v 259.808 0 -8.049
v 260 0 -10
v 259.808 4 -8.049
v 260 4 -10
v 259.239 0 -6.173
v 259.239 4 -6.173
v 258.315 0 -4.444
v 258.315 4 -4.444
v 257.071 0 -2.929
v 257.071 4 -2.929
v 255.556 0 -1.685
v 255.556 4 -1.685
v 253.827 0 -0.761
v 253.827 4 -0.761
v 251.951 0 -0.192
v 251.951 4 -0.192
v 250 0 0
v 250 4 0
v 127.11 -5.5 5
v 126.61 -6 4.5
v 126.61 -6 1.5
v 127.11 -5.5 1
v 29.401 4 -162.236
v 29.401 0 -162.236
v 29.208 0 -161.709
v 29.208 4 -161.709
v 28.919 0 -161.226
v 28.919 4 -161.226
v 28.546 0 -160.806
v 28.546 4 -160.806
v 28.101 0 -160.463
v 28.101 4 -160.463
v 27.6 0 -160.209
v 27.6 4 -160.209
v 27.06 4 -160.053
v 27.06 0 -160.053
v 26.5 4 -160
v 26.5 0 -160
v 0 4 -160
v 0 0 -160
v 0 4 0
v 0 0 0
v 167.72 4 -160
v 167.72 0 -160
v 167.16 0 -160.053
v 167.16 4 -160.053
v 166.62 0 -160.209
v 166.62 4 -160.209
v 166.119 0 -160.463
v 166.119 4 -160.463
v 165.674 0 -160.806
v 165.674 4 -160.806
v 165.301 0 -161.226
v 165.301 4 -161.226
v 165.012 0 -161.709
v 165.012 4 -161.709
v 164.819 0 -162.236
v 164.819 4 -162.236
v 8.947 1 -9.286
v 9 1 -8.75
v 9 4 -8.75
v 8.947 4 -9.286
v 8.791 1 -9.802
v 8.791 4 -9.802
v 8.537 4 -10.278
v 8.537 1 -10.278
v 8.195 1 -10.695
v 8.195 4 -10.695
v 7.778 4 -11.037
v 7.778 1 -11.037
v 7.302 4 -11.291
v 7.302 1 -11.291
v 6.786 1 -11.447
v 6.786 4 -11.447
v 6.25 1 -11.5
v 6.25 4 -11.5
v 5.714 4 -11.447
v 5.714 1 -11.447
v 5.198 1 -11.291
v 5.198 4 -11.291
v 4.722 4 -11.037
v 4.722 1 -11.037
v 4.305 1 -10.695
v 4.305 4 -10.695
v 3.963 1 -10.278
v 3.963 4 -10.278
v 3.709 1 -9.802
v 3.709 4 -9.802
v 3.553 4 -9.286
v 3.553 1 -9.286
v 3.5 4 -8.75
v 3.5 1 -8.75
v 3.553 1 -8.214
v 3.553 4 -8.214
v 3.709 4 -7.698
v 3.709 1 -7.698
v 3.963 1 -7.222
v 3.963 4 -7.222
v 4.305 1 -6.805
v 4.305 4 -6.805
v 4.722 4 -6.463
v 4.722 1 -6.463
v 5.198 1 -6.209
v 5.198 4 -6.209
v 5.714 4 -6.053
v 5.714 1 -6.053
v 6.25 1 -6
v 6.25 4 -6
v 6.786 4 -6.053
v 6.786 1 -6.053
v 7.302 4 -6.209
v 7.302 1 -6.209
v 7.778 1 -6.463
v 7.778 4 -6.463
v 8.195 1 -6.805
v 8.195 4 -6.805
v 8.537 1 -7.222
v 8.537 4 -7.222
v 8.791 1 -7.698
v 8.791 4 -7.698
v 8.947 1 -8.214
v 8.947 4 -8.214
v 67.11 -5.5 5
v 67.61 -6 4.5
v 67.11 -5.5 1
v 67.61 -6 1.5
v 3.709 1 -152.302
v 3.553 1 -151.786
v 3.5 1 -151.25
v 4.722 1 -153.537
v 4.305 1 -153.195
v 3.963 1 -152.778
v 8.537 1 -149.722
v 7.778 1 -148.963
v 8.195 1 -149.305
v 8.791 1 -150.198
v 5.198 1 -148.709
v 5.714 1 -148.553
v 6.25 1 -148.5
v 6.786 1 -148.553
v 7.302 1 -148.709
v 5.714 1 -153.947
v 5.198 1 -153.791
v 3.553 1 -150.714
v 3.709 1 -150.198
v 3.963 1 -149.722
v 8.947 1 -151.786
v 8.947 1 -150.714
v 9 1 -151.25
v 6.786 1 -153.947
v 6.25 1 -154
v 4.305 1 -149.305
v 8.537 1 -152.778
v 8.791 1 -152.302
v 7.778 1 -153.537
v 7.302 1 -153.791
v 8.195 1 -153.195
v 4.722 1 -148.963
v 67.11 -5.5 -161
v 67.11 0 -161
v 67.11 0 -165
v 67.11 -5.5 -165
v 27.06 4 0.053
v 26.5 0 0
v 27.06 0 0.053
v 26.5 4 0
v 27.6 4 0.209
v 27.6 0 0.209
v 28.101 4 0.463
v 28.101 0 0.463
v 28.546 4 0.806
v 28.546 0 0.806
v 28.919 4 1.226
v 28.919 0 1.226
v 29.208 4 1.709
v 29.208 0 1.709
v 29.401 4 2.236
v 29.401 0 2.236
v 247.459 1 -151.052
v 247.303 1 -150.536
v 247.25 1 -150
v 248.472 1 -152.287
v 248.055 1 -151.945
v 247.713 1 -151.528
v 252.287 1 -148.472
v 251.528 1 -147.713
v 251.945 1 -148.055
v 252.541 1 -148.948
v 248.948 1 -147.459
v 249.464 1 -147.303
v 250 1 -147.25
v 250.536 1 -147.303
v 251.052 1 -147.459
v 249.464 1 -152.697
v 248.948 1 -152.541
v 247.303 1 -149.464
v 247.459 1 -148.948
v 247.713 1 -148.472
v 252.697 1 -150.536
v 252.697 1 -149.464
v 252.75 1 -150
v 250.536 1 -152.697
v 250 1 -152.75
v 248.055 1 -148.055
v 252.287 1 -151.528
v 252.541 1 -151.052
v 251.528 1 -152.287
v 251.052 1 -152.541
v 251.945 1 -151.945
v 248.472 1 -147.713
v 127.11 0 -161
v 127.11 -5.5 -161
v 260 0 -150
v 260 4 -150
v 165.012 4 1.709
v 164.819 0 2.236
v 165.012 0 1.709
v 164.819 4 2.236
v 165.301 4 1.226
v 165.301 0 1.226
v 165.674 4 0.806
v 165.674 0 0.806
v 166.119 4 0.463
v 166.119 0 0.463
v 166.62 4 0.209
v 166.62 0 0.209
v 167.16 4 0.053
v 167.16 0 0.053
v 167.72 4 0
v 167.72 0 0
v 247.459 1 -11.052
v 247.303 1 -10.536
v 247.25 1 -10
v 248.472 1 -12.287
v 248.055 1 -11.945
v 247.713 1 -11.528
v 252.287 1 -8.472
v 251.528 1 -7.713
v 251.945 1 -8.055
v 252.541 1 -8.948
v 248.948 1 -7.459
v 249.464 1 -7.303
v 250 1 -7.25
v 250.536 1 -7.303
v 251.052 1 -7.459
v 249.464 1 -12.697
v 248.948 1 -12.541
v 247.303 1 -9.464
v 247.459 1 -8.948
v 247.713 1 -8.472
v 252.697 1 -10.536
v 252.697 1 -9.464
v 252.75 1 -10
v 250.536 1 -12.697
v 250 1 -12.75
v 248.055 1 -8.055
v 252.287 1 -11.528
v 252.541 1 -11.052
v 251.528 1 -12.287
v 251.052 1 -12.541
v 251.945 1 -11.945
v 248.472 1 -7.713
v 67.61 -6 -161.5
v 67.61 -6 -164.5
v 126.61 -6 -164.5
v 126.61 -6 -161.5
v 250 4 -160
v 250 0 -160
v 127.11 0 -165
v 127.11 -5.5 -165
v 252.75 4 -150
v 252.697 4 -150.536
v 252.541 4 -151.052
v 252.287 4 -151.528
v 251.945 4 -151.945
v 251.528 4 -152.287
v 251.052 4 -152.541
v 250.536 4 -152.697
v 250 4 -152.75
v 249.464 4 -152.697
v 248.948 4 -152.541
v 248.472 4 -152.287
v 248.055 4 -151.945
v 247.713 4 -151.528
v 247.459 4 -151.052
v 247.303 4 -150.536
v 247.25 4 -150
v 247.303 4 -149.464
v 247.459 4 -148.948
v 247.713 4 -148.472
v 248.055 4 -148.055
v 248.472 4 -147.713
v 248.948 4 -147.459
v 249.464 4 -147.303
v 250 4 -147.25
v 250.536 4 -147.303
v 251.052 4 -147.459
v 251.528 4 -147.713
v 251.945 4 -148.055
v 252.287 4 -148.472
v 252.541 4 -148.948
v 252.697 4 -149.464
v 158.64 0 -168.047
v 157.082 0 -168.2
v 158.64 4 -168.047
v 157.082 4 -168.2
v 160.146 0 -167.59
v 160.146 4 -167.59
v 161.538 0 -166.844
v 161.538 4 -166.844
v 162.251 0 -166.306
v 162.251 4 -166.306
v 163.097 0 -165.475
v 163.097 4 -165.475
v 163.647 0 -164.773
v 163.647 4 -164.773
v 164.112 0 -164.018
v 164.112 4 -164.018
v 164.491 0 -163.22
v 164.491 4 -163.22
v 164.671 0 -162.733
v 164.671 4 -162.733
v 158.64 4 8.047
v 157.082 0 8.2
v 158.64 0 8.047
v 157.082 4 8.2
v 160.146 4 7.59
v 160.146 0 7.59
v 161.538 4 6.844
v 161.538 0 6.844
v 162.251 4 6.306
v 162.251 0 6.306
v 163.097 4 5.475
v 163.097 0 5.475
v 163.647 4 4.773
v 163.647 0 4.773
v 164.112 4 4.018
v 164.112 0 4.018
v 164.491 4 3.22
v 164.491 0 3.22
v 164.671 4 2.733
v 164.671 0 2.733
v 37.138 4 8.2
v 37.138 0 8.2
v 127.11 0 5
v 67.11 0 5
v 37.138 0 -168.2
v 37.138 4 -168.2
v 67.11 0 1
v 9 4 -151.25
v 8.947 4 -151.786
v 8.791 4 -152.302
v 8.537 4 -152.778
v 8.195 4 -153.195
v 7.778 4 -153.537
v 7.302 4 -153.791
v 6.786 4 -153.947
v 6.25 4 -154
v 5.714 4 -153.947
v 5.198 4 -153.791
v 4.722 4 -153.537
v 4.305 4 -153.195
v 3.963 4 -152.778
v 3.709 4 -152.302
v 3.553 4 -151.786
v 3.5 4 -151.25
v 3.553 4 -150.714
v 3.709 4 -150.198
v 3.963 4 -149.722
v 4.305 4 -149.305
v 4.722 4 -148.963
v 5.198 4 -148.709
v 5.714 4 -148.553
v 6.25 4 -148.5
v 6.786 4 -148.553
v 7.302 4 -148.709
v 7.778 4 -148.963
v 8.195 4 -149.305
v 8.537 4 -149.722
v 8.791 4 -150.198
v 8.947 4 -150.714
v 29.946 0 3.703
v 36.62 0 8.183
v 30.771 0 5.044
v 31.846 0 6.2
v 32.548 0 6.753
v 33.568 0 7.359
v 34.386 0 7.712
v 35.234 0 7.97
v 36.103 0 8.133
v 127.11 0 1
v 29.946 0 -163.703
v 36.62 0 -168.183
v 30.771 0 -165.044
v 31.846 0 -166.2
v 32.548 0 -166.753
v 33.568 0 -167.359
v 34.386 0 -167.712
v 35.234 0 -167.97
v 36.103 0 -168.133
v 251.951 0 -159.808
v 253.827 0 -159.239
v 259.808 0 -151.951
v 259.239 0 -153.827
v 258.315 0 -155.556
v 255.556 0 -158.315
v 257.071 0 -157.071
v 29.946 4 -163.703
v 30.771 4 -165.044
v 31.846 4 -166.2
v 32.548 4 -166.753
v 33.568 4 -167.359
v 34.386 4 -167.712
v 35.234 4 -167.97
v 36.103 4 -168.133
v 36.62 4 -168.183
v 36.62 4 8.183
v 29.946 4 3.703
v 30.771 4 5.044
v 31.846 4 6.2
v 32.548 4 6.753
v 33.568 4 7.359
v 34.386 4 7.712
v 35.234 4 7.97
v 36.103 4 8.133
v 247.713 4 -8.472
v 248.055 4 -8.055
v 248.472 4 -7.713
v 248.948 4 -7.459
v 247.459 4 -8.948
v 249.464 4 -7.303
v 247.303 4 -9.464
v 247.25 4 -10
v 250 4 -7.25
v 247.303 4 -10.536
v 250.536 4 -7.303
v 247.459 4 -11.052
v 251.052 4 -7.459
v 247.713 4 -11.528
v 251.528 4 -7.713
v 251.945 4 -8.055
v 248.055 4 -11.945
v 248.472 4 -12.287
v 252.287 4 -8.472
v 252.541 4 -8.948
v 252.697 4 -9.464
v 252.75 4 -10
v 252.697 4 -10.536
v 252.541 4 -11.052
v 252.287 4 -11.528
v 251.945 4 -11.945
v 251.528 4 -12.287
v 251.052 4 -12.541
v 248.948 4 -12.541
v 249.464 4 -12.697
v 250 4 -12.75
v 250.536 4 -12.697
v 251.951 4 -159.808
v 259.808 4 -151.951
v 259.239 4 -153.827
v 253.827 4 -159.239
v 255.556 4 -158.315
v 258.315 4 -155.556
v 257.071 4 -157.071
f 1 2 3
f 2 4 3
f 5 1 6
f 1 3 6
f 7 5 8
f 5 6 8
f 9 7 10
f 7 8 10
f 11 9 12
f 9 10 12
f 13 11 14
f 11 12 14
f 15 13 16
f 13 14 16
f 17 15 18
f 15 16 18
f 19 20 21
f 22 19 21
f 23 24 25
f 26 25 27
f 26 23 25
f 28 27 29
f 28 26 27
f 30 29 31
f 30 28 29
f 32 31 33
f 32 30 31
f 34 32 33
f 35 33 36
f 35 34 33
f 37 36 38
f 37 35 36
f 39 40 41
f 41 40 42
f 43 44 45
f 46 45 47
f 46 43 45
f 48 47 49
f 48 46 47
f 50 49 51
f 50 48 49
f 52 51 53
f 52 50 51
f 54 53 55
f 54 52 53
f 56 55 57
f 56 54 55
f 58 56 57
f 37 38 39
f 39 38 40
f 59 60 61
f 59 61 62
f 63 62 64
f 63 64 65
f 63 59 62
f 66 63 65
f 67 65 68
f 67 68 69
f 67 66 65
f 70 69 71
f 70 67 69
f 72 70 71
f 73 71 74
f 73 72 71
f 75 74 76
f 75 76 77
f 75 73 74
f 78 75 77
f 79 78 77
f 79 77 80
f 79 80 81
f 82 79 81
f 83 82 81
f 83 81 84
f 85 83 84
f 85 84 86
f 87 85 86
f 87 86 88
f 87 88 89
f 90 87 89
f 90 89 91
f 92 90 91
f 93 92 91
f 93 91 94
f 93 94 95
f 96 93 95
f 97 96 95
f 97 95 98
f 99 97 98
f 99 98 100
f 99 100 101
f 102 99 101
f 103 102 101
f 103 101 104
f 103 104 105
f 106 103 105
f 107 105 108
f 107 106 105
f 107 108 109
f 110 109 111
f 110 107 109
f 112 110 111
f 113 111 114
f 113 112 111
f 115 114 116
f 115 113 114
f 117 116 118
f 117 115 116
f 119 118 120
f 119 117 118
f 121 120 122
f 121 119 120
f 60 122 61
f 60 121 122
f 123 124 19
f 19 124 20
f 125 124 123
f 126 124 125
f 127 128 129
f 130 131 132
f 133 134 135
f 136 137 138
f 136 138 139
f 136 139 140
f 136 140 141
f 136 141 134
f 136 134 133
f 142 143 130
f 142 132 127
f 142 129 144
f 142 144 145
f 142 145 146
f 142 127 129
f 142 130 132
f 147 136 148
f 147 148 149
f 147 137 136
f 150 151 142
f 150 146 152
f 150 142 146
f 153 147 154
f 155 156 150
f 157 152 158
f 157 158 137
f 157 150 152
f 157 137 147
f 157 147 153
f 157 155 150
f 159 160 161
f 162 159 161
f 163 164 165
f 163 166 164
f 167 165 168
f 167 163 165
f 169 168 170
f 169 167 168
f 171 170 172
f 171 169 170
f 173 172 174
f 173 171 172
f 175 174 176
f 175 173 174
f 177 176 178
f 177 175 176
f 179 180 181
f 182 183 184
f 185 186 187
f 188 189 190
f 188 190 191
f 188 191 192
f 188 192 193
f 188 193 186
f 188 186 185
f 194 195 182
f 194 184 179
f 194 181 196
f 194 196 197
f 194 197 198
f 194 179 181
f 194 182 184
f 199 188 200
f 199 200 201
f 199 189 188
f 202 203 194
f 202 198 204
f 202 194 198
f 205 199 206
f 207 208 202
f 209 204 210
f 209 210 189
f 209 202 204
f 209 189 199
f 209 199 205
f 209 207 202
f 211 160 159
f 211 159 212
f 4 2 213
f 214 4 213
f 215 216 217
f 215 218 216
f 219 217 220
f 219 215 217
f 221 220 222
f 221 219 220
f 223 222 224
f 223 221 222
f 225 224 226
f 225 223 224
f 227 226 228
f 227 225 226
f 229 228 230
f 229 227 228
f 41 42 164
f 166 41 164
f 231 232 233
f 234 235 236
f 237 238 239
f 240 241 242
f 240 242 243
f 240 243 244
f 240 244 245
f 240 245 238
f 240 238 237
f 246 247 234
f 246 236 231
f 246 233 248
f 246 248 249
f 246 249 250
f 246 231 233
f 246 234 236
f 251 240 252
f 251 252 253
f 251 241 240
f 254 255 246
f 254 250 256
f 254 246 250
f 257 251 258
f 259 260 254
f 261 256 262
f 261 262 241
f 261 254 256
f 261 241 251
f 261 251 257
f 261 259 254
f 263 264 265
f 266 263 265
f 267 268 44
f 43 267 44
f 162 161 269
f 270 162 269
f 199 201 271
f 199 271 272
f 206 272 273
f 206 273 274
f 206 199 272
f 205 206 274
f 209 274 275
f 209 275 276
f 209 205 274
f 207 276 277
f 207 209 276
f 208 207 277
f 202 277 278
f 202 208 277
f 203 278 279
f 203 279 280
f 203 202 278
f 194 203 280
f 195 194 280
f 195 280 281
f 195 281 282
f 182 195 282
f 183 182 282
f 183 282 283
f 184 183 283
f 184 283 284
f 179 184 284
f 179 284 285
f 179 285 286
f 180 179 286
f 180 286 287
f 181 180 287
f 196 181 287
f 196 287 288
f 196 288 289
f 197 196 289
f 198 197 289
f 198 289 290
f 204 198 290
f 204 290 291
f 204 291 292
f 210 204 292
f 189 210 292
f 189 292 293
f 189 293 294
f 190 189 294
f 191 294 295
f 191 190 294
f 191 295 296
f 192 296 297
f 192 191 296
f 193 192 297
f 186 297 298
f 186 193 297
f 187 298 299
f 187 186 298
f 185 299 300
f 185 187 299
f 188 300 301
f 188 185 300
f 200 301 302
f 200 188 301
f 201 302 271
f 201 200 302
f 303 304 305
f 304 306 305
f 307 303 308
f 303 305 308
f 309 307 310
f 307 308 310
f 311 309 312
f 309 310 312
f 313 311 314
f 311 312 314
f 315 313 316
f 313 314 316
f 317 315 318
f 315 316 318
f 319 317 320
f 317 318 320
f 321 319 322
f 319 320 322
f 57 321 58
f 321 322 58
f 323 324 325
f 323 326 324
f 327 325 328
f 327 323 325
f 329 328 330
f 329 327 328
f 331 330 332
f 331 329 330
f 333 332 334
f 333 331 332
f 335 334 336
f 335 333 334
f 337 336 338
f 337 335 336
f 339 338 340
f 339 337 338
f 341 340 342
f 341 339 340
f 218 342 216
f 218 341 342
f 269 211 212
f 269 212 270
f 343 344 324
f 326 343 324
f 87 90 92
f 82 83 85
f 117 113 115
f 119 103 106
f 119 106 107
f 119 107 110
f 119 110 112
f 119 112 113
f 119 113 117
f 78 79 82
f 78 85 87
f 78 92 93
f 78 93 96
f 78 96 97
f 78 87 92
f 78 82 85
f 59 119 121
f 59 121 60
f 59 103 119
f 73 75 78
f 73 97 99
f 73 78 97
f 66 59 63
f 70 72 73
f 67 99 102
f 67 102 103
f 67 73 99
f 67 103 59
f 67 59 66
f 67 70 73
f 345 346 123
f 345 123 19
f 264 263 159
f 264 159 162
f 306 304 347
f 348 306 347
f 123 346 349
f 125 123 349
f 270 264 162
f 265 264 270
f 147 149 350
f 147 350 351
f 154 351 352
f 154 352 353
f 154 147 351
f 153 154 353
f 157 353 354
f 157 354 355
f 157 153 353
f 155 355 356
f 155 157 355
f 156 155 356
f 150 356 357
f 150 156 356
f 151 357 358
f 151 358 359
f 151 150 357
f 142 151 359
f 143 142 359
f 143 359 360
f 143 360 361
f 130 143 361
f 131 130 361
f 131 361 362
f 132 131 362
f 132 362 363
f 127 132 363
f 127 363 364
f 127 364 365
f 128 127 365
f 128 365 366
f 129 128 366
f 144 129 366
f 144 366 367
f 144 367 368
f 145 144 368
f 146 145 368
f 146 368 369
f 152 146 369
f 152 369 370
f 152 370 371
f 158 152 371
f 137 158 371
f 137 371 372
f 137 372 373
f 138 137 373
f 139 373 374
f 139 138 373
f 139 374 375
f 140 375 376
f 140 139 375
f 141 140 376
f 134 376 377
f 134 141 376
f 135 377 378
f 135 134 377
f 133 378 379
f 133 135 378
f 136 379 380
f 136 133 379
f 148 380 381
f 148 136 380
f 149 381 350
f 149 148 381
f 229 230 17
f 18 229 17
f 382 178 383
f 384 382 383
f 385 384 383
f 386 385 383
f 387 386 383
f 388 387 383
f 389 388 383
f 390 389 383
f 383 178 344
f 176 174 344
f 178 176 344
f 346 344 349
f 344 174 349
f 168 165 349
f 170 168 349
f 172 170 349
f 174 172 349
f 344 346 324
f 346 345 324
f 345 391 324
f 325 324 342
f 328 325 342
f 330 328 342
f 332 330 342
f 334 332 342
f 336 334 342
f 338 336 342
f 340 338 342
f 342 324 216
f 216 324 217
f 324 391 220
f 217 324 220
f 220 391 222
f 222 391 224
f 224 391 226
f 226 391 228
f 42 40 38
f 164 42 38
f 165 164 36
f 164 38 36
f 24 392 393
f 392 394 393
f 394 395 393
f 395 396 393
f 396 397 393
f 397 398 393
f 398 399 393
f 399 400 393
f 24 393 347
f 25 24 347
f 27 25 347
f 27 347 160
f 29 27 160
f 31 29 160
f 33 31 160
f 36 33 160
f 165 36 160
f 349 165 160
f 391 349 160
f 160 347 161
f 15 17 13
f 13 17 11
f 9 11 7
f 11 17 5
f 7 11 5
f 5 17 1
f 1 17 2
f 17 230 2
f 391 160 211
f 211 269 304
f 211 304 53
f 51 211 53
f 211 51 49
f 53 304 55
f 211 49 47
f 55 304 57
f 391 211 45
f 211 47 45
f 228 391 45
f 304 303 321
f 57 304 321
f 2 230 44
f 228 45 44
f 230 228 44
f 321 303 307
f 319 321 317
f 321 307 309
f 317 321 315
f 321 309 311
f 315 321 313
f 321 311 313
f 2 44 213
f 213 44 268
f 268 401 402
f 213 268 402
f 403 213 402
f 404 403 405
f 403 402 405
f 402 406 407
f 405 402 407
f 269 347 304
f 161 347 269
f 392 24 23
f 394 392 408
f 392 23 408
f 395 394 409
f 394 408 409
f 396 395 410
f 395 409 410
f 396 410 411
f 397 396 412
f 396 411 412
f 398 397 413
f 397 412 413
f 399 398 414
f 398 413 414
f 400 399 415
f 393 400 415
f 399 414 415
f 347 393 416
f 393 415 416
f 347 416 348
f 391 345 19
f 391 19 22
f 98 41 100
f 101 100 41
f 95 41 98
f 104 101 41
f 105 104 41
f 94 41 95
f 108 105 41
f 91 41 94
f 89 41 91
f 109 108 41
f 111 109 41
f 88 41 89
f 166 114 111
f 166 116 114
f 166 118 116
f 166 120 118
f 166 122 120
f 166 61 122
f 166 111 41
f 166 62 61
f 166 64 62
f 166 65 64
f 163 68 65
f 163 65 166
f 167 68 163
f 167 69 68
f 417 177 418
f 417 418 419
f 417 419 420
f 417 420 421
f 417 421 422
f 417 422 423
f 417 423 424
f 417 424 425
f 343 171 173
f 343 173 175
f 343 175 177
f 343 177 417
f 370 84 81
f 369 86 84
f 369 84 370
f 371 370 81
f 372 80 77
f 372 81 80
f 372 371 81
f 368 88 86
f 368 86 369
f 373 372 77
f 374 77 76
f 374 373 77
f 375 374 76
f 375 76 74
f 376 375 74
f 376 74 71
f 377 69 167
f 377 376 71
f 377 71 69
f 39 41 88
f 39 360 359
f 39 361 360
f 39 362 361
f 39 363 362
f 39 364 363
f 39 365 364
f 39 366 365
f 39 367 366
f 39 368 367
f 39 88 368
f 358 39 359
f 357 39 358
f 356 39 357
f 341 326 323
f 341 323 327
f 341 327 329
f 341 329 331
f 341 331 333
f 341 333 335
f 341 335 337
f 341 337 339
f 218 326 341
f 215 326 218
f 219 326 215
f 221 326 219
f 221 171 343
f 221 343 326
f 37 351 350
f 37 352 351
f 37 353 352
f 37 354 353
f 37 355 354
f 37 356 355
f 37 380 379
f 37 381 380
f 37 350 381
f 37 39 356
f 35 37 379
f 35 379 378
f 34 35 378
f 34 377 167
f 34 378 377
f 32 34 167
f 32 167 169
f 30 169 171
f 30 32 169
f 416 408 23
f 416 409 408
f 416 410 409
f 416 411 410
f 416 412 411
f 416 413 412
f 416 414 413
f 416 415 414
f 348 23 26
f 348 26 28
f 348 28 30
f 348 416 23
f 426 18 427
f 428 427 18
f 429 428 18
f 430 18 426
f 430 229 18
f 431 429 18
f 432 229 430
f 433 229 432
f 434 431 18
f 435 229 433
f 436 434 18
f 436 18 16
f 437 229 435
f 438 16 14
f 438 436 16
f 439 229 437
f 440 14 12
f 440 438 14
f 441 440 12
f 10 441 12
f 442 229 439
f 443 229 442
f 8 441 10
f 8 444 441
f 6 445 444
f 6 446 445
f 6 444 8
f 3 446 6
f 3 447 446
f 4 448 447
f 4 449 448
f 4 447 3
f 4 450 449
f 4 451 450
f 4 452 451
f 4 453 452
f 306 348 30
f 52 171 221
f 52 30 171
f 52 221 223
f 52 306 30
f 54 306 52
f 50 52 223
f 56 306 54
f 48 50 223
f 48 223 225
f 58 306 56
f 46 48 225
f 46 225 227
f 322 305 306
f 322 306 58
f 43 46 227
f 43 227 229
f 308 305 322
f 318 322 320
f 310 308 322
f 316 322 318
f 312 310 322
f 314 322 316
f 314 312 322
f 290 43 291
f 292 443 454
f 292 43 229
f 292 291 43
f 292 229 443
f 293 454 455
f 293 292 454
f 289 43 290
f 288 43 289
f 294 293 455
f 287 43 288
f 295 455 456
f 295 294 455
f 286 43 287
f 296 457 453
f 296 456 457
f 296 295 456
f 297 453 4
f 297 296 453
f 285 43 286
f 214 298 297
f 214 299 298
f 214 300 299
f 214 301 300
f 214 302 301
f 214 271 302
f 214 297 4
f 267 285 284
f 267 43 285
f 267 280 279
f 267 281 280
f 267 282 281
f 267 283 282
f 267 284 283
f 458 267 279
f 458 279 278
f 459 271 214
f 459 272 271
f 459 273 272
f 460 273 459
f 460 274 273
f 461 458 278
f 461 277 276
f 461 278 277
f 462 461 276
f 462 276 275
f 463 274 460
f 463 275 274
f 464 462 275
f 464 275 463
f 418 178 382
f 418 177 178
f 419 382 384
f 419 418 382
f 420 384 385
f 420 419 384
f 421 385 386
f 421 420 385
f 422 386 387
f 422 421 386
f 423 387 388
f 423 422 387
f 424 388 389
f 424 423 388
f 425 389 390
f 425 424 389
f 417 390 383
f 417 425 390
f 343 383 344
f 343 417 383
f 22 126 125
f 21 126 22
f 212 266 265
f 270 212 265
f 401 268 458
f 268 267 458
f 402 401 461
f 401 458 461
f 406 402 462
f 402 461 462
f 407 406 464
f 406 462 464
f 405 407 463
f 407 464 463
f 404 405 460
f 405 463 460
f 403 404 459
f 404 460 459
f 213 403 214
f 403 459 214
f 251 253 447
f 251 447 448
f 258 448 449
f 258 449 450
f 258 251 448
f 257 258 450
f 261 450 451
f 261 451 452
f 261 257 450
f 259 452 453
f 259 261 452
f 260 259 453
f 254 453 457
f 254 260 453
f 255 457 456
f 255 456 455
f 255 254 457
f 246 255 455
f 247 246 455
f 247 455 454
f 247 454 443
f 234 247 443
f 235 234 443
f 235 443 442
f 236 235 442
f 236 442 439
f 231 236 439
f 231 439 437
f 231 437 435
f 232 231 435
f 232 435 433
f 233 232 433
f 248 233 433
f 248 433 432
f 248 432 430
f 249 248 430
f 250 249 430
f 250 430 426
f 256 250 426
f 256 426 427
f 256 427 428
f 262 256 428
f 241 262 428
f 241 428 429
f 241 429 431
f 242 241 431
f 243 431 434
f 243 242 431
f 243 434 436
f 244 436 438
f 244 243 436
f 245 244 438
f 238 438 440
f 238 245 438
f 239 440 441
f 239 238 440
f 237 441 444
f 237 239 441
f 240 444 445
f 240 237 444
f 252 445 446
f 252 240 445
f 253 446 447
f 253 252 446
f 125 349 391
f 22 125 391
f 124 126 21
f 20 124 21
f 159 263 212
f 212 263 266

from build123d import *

# Parameters (mm, degrees)
BOSS_EXTRUDE1_DEPTH = 4
FILLET1_R           = 3
FILLET2_R           = 8
FILLET3_R           = 10
SKETCH2_R           = 2.75
CUT_EXTRUDE2_DEPTH  = 4
SKETCH3_W           = 60
SKETCH3_H           = 4
BOSS_EXTRUDE2_DEPTH = 6
CHAMFER1_SIZE       = 0.5
SKETCH2_3_R         = 2.75
BOSS_EXTRUDE3_DEPTH = 1


with BuildPart() as part:
    # Sketch1 → Boss-Extrude1 (new body)
    with BuildSketch(Plane(origin=(0, 0, 0), x_dir=(1, 0, 0), z_dir=(0, 1, 0))):
        Polygon((29.5, 168.2), (29.5, 160), (0, 160), (0, 80), (0, 0), (29.5, 0), (29.5, -8.2), (164.72, -8.2), (164.72, 0), (260, 0), (260, 160), (164.72, 160), (164.72, 168.2), align=None)
    extrude(amount=BOSS_EXTRUDE1_DEPTH)

    # Fillet1
    fillet1_edges = [part.edges().sort_by_distance(p)[0] for p in [
        (164.72, 2, 0),
        (29.5, 2, 0),
        (29.5, 2, -160),
        (164.72, 2, -160),
    ]]
    fillet(fillet1_edges, radius=FILLET1_R)

    # Fillet2
    fillet2_edges = [part.edges().sort_by_distance(p)[0] for p in [
        (29.5, 2, -168.2),
        (164.72, 2, -168.2),
        (29.5, 2, 8.2),
        (164.72, 2, 8.2),
    ]]
    fillet(fillet2_edges, radius=FILLET2_R)

    # Fillet3
    fillet3_edges = [part.edges().sort_by_distance(p)[0] for p in [
        (260, 2, -160),
        (260, 2, 0),
    ]]
    fillet(fillet3_edges, radius=FILLET3_R)

    # Sketch2 → Cut-Extrude2 (cut)
    with BuildSketch(Plane(origin=(0, 0, 0), x_dir=(1, 0, 0), z_dir=(0, 1, 0))):
        with Locations((6.25, 151.25)):
            Circle(SKETCH2_R)
        with Locations((250, 150)):
            Circle(SKETCH2_R)
        with Locations((250, 10)):
            Circle(SKETCH2_R)
        with Locations((6.25, 8.75)):
            Circle(SKETCH2_R)
    extrude(amount=CUT_EXTRUDE2_DEPTH, mode=Mode.SUBTRACT)

    # Sketch3 → Boss-Extrude2 (add)
    with BuildSketch(Plane(origin=(0, 0, 0), x_dir=(1, 0, 0), z_dir=(0, 1, 0))):
        with Locations((97.11, 163)):
            Rectangle(SKETCH3_W, SKETCH3_H)
        with Locations((97.11, -3)):
            Rectangle(SKETCH3_W, SKETCH3_H)
    extrude(amount=-BOSS_EXTRUDE2_DEPTH)

    # Chamfer1
    chamfer1_edges = [part.edges().sort_by_distance(p)[0] for p in [
        (67.11, -6, -163),
        (97.11, -6, -161),
        (97.11, -6, -165),
        (127.11, -6, -163),
        (127.11, -6, 3),
        (97.11, -6, 5),
        (67.11, -6, 3),
        (97.11, -6, 1),
    ]]
    chamfer(chamfer1_edges, length=CHAMFER1_SIZE)

    # Sketch2<3> → Boss-Extrude3 (add)
    with BuildSketch(Plane(origin=(0, 0, 0), x_dir=(1, 0, 0), z_dir=(0, 1, 0))):
        with Locations((6.25, 151.25)):
            Circle(SKETCH2_3_R)
        with Locations((250, 150)):
            Circle(SKETCH2_3_R)
        with Locations((250, 10)):
            Circle(SKETCH2_3_R)
        with Locations((6.25, 8.75)):
            Circle(SKETCH2_3_R)
    extrude(amount=BOSS_EXTRUDE3_DEPTH)


solid = part.part
